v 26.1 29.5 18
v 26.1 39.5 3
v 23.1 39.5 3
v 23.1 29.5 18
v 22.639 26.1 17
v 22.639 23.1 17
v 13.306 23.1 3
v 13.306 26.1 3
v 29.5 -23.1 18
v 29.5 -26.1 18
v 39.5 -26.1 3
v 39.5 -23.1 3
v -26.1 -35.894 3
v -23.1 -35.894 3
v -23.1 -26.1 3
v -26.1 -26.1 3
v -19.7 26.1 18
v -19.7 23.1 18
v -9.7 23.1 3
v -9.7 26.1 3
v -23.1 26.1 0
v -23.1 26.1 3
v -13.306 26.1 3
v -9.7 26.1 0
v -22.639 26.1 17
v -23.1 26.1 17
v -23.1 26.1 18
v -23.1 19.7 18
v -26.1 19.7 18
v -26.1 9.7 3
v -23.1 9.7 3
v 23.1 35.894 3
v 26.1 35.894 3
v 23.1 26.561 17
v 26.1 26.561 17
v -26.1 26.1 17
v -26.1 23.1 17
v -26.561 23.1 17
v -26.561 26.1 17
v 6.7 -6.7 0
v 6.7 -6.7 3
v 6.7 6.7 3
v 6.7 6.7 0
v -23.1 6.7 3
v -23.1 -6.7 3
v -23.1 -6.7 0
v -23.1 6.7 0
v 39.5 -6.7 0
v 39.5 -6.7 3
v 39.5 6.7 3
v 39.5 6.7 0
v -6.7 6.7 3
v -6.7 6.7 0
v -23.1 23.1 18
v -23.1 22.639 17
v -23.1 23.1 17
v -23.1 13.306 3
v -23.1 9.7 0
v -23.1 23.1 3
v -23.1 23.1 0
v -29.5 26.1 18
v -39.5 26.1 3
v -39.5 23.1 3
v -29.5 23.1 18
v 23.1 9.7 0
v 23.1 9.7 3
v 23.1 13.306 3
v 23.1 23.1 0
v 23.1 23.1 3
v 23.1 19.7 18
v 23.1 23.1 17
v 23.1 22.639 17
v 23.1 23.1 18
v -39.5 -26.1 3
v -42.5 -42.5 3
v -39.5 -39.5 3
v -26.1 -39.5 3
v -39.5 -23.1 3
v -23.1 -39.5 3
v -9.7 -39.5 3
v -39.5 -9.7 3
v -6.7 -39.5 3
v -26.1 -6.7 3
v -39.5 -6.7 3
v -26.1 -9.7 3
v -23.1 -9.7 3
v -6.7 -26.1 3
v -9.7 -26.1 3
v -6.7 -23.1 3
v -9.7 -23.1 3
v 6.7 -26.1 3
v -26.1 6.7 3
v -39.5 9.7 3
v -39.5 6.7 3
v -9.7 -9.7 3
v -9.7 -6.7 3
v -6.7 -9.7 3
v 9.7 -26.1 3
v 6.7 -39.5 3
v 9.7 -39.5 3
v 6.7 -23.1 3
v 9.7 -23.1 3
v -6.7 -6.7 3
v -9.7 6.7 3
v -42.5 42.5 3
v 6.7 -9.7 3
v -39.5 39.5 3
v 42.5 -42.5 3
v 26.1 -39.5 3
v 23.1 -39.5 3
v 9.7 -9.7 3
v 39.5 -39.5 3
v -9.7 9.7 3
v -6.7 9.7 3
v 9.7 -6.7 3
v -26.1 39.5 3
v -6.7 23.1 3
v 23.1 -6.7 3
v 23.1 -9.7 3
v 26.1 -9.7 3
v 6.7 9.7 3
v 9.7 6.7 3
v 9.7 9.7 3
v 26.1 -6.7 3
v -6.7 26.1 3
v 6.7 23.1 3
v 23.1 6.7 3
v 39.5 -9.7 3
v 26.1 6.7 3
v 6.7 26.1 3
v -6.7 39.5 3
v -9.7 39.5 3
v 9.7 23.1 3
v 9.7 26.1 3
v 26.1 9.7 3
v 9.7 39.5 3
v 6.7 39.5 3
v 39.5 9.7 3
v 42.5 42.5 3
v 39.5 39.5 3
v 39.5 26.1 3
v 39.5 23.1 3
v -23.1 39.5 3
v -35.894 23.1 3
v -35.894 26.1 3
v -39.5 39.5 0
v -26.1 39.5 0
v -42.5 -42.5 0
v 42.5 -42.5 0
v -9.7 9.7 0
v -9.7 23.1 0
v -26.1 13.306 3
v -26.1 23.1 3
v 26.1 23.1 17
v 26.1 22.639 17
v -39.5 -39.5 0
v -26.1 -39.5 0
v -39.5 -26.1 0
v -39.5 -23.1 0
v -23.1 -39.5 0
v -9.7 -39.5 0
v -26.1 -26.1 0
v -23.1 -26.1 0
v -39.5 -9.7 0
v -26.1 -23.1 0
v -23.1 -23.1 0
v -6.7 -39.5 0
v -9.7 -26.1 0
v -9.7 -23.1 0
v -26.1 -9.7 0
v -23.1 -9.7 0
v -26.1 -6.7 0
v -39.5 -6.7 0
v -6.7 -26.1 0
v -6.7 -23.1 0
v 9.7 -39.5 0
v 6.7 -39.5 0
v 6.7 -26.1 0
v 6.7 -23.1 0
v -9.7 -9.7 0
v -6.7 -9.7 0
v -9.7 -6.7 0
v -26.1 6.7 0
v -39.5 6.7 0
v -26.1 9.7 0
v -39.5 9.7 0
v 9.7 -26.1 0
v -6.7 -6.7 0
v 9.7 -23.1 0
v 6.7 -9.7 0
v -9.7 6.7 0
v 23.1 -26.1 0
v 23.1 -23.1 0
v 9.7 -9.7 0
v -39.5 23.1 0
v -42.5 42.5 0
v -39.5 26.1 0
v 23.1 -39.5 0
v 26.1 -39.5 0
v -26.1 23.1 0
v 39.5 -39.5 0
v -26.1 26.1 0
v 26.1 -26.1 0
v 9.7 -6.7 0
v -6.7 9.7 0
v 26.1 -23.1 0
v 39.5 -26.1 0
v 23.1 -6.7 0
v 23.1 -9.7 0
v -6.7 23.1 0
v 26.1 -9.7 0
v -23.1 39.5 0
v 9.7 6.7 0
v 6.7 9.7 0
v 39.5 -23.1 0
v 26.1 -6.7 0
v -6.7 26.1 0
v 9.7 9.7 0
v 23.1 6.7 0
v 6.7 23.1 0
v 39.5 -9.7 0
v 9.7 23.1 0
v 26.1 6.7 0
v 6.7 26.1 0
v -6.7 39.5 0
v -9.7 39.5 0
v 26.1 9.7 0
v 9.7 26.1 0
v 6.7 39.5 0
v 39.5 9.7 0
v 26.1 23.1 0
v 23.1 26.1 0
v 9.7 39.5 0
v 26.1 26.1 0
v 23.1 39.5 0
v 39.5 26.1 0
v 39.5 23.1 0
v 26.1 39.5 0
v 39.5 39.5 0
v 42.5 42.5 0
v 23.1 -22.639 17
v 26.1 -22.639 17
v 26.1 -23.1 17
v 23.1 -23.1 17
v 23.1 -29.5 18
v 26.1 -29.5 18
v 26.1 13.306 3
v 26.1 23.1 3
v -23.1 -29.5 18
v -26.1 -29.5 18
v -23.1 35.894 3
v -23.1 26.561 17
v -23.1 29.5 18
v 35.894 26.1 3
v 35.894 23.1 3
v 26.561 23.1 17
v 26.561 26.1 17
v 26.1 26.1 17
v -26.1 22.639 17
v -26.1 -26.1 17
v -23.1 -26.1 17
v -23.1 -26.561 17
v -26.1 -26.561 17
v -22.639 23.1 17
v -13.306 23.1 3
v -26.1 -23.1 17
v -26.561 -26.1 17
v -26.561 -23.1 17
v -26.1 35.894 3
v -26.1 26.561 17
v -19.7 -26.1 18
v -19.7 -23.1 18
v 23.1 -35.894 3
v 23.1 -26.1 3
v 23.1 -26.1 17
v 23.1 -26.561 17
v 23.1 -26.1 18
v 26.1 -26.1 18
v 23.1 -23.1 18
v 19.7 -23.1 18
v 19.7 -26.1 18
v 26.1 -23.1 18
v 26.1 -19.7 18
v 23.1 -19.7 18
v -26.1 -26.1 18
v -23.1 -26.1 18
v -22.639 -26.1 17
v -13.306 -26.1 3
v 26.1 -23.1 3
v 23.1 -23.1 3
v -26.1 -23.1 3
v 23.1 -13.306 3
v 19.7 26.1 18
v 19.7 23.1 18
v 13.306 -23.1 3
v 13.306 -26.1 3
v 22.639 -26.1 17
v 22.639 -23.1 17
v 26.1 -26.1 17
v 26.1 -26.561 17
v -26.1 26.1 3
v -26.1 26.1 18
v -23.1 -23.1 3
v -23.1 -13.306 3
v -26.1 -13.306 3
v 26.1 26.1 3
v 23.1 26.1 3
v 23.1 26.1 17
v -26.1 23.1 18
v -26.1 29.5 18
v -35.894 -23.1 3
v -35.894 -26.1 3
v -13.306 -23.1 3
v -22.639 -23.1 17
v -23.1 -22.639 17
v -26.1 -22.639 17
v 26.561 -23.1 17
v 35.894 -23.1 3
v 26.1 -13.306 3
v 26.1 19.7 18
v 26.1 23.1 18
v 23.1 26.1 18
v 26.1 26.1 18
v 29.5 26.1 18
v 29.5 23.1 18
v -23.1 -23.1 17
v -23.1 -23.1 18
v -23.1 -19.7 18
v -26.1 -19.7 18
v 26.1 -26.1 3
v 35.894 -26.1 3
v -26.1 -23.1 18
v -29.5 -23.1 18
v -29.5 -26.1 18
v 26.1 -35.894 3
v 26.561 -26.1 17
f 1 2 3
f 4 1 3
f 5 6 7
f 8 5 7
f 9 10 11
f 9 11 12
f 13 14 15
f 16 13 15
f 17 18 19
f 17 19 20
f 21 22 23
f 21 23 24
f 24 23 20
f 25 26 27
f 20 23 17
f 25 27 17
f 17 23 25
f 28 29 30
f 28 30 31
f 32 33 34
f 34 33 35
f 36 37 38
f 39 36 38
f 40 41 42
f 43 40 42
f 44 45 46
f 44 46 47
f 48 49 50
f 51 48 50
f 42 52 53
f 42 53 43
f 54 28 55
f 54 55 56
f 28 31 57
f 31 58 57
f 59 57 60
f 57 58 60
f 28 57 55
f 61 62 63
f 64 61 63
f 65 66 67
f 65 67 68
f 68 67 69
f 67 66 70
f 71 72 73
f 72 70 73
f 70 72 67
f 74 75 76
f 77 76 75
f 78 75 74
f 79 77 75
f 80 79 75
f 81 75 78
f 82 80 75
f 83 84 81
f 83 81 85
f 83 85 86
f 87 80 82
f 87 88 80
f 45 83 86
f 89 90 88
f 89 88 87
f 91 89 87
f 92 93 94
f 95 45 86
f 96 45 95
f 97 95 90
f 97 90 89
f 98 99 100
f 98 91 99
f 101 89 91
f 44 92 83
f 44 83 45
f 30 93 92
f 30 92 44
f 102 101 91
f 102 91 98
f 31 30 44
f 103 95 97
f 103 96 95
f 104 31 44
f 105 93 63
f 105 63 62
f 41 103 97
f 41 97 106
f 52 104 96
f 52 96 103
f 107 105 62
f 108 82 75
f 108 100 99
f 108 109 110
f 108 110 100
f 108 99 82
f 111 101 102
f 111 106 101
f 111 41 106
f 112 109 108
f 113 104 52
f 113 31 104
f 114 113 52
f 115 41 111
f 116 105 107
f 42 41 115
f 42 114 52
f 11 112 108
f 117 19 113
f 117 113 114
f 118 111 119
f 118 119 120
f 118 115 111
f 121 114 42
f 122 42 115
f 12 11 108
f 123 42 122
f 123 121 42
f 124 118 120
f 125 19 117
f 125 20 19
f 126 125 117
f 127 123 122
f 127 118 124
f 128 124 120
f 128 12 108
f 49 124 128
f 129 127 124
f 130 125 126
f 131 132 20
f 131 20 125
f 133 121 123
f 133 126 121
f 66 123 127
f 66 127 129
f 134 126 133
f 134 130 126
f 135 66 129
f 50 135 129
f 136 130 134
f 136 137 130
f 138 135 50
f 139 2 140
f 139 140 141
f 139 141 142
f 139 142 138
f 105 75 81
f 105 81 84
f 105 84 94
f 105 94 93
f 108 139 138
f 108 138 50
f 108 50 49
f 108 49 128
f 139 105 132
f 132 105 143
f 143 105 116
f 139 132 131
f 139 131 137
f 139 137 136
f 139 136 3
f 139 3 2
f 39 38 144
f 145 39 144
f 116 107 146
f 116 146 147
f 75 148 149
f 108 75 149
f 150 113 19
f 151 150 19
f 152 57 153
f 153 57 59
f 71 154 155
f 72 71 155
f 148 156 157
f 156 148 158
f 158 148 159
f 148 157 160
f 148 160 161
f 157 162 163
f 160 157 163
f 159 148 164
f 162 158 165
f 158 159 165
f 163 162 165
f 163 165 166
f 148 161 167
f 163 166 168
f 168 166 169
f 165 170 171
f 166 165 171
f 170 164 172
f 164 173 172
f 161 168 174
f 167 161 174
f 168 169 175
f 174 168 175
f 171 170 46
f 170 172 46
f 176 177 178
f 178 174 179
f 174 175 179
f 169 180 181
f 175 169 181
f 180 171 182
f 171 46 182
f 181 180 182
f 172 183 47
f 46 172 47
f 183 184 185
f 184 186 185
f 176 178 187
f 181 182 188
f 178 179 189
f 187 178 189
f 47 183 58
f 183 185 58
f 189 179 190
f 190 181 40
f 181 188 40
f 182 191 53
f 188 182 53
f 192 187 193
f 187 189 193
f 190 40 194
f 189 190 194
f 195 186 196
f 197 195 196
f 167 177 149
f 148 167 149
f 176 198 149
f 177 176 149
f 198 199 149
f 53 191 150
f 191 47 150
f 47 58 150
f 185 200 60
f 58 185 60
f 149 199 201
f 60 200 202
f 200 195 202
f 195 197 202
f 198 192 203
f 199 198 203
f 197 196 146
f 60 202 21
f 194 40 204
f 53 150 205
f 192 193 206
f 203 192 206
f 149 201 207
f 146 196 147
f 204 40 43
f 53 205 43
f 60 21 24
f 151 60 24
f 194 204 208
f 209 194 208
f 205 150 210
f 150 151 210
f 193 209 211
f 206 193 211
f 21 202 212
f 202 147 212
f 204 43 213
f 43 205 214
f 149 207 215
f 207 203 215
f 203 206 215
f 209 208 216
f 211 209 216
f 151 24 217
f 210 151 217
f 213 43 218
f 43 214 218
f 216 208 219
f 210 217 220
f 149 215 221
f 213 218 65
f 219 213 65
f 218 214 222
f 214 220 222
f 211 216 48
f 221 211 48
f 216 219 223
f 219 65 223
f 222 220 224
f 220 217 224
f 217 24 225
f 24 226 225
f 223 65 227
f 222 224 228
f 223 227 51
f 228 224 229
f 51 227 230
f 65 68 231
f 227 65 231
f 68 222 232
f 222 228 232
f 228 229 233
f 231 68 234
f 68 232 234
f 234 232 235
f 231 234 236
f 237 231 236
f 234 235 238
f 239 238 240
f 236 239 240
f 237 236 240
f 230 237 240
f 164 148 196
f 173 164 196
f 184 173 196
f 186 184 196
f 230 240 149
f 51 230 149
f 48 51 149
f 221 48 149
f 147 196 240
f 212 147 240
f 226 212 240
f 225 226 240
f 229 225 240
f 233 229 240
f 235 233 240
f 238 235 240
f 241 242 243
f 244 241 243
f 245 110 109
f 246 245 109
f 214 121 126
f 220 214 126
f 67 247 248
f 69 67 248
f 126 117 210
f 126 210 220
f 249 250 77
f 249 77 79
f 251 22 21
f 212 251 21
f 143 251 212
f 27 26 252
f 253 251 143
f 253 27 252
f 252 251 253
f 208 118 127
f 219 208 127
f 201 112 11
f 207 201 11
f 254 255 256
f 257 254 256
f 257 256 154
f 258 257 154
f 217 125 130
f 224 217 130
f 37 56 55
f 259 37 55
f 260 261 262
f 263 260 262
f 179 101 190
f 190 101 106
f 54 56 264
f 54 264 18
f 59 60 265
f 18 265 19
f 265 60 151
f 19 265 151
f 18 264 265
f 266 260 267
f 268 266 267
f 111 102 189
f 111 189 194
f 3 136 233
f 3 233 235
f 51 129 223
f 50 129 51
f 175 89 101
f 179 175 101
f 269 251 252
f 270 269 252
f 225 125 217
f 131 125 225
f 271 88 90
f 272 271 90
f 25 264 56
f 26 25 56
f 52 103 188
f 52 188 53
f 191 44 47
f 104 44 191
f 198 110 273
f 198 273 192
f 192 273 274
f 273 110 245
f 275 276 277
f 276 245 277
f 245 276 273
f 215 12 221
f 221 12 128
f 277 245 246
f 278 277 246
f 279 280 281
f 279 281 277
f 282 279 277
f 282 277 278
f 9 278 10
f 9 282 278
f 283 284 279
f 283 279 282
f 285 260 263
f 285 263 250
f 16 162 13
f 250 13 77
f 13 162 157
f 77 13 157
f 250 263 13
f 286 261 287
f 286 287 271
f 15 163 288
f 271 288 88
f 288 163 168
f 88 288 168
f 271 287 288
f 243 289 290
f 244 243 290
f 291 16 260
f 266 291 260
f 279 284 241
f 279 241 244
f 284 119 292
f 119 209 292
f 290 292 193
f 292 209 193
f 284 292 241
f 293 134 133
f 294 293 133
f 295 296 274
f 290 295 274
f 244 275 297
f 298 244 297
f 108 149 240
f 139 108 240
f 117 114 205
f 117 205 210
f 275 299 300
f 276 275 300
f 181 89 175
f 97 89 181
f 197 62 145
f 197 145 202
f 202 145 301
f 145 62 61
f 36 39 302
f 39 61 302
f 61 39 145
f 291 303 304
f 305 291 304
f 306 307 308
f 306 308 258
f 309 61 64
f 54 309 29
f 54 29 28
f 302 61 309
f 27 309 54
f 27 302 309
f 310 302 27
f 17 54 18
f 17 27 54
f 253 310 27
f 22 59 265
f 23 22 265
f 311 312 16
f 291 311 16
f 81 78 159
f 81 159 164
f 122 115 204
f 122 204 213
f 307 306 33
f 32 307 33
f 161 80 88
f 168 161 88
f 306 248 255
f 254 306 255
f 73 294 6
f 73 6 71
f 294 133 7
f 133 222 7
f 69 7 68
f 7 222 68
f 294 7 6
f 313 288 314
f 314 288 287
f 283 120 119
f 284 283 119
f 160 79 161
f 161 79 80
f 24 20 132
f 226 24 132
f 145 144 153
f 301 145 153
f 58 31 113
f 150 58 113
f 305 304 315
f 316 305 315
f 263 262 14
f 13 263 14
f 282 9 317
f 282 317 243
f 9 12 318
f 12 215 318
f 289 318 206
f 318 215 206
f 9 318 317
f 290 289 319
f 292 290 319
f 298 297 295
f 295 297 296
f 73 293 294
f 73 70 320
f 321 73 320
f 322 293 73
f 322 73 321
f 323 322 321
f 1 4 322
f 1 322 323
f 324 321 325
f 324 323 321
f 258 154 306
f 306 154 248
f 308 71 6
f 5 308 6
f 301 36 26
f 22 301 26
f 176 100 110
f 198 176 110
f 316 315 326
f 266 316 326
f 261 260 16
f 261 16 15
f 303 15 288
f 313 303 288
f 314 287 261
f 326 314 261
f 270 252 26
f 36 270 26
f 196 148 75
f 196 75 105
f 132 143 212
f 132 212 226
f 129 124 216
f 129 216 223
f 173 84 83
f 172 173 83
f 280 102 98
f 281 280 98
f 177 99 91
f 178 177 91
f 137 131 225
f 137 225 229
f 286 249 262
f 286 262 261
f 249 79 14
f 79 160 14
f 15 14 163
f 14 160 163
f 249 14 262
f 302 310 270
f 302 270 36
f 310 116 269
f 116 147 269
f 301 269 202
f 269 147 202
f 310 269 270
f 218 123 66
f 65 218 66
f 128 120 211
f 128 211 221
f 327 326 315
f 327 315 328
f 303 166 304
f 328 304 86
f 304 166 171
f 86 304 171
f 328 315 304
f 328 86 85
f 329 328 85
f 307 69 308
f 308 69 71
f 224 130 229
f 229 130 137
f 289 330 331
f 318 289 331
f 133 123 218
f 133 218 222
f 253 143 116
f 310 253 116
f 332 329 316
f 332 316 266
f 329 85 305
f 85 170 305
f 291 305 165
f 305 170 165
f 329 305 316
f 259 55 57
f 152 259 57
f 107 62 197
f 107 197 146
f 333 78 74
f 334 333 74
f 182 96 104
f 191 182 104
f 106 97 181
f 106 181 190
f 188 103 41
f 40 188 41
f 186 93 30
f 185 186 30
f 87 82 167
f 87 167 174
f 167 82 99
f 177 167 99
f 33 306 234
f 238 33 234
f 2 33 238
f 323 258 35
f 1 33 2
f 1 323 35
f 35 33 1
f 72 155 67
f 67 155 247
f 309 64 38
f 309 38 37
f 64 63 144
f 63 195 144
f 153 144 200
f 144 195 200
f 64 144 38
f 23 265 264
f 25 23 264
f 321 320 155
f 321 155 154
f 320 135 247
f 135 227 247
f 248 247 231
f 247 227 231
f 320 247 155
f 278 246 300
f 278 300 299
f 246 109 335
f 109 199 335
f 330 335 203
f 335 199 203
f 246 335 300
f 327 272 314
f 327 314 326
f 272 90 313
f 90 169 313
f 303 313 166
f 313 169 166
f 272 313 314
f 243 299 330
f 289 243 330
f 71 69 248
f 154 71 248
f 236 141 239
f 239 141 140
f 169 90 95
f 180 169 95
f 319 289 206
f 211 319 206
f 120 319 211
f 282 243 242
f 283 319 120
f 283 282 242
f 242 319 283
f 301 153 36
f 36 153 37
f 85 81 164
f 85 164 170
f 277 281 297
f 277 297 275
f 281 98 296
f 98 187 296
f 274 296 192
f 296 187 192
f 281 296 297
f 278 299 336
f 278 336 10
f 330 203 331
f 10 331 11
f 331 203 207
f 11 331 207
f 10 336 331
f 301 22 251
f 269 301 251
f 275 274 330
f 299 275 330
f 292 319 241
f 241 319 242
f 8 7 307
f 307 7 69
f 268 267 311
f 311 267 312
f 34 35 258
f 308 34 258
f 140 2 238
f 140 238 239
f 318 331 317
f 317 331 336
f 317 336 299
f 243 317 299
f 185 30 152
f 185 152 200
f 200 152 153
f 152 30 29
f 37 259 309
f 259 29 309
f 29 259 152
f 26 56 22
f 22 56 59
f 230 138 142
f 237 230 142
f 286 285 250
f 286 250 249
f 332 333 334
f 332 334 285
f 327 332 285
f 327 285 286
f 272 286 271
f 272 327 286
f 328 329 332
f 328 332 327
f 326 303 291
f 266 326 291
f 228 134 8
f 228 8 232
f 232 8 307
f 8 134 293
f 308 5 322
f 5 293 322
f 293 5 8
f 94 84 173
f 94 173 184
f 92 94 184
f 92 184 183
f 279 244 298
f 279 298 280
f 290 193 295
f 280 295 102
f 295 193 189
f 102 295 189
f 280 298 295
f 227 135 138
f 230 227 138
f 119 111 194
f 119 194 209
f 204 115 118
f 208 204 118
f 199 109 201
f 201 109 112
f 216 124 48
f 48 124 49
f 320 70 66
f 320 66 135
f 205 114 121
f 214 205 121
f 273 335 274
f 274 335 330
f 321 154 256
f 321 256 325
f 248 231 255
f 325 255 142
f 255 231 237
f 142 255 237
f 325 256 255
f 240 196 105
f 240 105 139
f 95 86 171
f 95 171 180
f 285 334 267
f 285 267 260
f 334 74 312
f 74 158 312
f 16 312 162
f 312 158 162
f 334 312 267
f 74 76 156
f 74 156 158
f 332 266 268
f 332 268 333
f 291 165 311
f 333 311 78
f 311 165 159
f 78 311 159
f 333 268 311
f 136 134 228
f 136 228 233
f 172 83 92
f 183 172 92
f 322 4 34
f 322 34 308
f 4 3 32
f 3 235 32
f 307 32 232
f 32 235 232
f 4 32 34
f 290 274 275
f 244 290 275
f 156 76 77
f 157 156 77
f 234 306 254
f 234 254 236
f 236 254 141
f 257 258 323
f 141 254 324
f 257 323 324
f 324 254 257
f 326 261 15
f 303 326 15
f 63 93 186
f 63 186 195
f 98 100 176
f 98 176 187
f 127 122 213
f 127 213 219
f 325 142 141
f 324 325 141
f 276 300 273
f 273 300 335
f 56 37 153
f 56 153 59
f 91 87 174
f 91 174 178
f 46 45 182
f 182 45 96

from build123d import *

# Parameters (mm, degrees)
F0_W       = 85
F0_H       = 85
F1_DEPTH   = 3
F2_W       = 13.4
F2_H       = 13.4
F3_DEPTH   = 25
F5_DEPTH   = 15
F6_SIZE2   = 14.99999
F6_SIZE    = 9.99999
F6_2_SIZE2 = 14.99999
F6_2_SIZE  = 9.99999
F6_3_SIZE2 = 14.99999
F6_3_SIZE  = 9.99999
F6_4_SIZE2 = 14.99999
F6_4_SIZE  = 9.99999
F7_SIZE2   = 9.99999
F7_SIZE    = 14.99999
F7_2_SIZE2 = 9.99999
F7_2_SIZE  = 14.99999
F7_3_SIZE2 = 9.99999
F7_3_SIZE  = 14.99999
F7_4_SIZE2 = 9.99999
F7_4_SIZE  = 14.99999
F7_5_SIZE2 = 9.99999
F7_5_SIZE  = 14.99999
F9_DEPTH   = 68.601
F11_DEPTH  = 68.601


# Not quite as in the source:
# - a fillet or chamfer is up to 0.001 mm smaller than in the source, because OpenCascade refuses the exact size
# - a feature names something its author has since deleted; it is built from what else it names


with BuildPart() as f1:
    # F0 (on Top) → F1 (new body)
    with BuildSketch(Plane.XY):
        Rectangle(F0_W, F0_H)
    extrude(amount=F1_DEPTH)

    # F2 (on face) → F3 (cut)
    with BuildSketch(Plane.XY.offset(3)):
        with Locations((-32.8, 16.4)):
            Rectangle(F2_W, F2_H)
        with Locations((-32.8, 0)):
            Rectangle(F2_W, F2_H)
        with Locations((-32.8, -16.4)):
            Rectangle(F2_W, F2_H)
        with Locations((-32.8, -32.8)):
            Rectangle(F2_W, F2_H)
        with Locations((-16.4, 32.8)):
            Rectangle(F2_W, F2_H)
        with Locations((-16.4, 16.4)):
            Rectangle(F2_W, F2_H)
        with Locations((-16.4, 0)):
            Rectangle(F2_W, F2_H)
        with Locations((-16.4, -16.4)):
            Rectangle(F2_W, F2_H)
        with Locations((-16.4, -32.8)):
            Rectangle(F2_W, F2_H)
        with Locations((0, 32.8)):
            Rectangle(F2_W, F2_H)
        with Locations((0, 16.4)):
            Rectangle(F2_W, F2_H)
        Rectangle(F2_W, F2_H)
        with Locations((0, -16.4)):
            Rectangle(F2_W, F2_H)
        with Locations((0, -32.8)):
            Rectangle(F2_W, F2_H)
        with Locations((16.4, 32.8)):
            Rectangle(F2_W, F2_H)
        with Locations((16.4, 16.4)):
            Rectangle(F2_W, F2_H)
        with Locations((16.4, 0)):
            Rectangle(F2_W, F2_H)
        with Locations((16.4, -16.4)):
            Rectangle(F2_W, F2_H)
        with Locations((16.4, -32.8)):
            Rectangle(F2_W, F2_H)
        with Locations((32.8, 32.8)):
            Rectangle(F2_W, F2_H)
        with Locations((32.8, 16.4)):
            Rectangle(F2_W, F2_H)
        with Locations((32.8, 0)):
            Rectangle(F2_W, F2_H)
        with Locations((32.8, -16.4)):
            Rectangle(F2_W, F2_H)
        with Locations((32.8, -32.8)):
            Rectangle(F2_W, F2_H)
        with Locations((-32.8, 32.8)):
            Rectangle(F2_W, F2_H)
    extrude(amount=-F3_DEPTH, mode=Mode.SUBTRACT)

    # F4 (on face) → F5 (join)
    with BuildSketch(Plane.XY.offset(3)):
        Polygon((-23.1, -9.7), (-26.1, -9.7), (-26.1, -23.1), (-39.5, -23.1), (-39.5, -26.1), (-26.1, -26.1), (-26.1, -39.5), (-23.1, -39.5), (-23.1, -26.1), (-9.7, -26.1), (-9.7, -23.1), (-23.1, -23.1), align=None)
        Polygon((-9.7, 23.1), (-9.7, 26.1), (-23.1, 26.1), (-23.1, 39.5), (-26.1, 39.5), (-26.1, 26.1), (-39.5, 26.1), (-39.5, 23.1), (-26.1, 23.1), (-26.1, 9.7), (-23.1, 9.7), (-23.1, 23.1), align=None)
        Polygon((26.1, 26.1), (26.1, 39.5), (23.1, 39.5), (23.1, 26.1), (9.7, 26.1), (9.7, 23.1), (23.1, 23.1), (23.1, 9.7), (26.1, 9.7), (26.1, 23.1), (39.5, 23.1), (39.5, 26.1), align=None)
        Polygon((26.1, -23.1), (26.1, -9.7), (23.1, -9.7), (23.1, -23.1), (9.7, -23.1), (9.7, -26.1), (23.1, -26.1), (23.1, -39.5), (26.1, -39.5), (26.1, -26.1), (39.5, -26.1), (39.5, -23.1), align=None)
    extrude(amount=F5_DEPTH)

    # F6 (size 10 and 15 in the source; OpenCascade refuses exactly that, so slightly less here)
    f6_edges = [f1.edges().sort_by_distance(p)[0] for p in [
        (-39.5, -24.6, 18),
        (-24.6, -9.7, 18),
        (-9.7, -24.6, 18),
        (-24.6, -39.5, 18),
    ]]
    f6_side = f1.faces().sort_by_distance((-24.6, -24.6, 18))[0]
    chamfer(f6_edges, length=F6_SIZE, length2=F6_SIZE2, reference=f6_side)

    # F6#2 (size 10 and 15 in the source; OpenCascade refuses exactly that, so slightly less here)
    f6_2_edges = [f1.edges().sort_by_distance(p)[0] for p in [
        (-39.5, 24.6, 18),
        (-24.6, 39.5, 18),
    ]]
    f6_2_side = f1.faces().sort_by_distance((-24.6, 24.6, 18))[0]
    chamfer(f6_2_edges, length=F6_2_SIZE, length2=F6_2_SIZE2, reference=f6_2_side)

    # F6#3 (size 10 and 15 in the source; OpenCascade refuses exactly that, so slightly less here)
    f6_3_edges = [f1.edges().sort_by_distance(p)[0] for p in [
        (9.7, 24.6, 18),
        (24.6, 39.5, 18),
    ]]
    f6_3_side = f1.faces().sort_by_distance((24.6, 24.6, 18))[0]
    chamfer(f6_3_edges, length=F6_3_SIZE, length2=F6_3_SIZE2, reference=f6_3_side)

    # F6#4 (size 10 and 15 in the source; OpenCascade refuses exactly that, so slightly less here)
    f6_4_edges = [f1.edges().sort_by_distance(p)[0] for p in [
        (24.6, -9.7, 18),
        (9.7, -24.6, 18),
        (39.5, -24.6, 18),
    ]]
    f6_4_side = f1.faces().sort_by_distance((24.6, -24.6, 18))[0]
    chamfer(f6_4_edges, length=F6_4_SIZE, length2=F6_4_SIZE2, reference=f6_4_side)

    # F7 (size 15 and 10 in the source; OpenCascade refuses exactly that, so slightly less here)
    f7_edges = [f1.edges().sort_by_distance(p)[0] for p in [
        (-9.7, 24.6, 18),
    ]]
    f7_side = f1.faces().sort_by_distance((-9.7, 24.6, 10.5))[0]
    chamfer(f7_edges, length=F7_SIZE, length2=F7_SIZE2, reference=f7_side)

    # F7#2 (size 15 and 10 in the source; OpenCascade refuses exactly that, so slightly less here)
    f7_2_edges = [f1.edges().sort_by_distance(p)[0] for p in [
        (-24.6, 9.7, 18),
    ]]
    f7_2_side = f1.faces().sort_by_distance((-24.6, 9.7, 10.5))[0]
    chamfer(f7_2_edges, length=F7_2_SIZE, length2=F7_2_SIZE2, reference=f7_2_side)

    # F7#3 (size 15 and 10 in the source; OpenCascade refuses exactly that, so slightly less here)
    f7_3_edges = [f1.edges().sort_by_distance(p)[0] for p in [
        (24.6, 9.7, 18),
    ]]
    f7_3_side = f1.faces().sort_by_distance((24.6, 9.7, 10.5))[0]
    chamfer(f7_3_edges, length=F7_3_SIZE, length2=F7_3_SIZE2, reference=f7_3_side)

    # F7#4 (size 15 and 10 in the source; OpenCascade refuses exactly that, so slightly less here)
    f7_4_edges = [f1.edges().sort_by_distance(p)[0] for p in [
        (39.5, 24.6, 18),
    ]]
    f7_4_side = f1.faces().sort_by_distance((39.5, 24.6, 10.5))[0]
    chamfer(f7_4_edges, length=F7_4_SIZE, length2=F7_4_SIZE2, reference=f7_4_side)

    # F7#5 (size 15 and 10 in the source; OpenCascade refuses exactly that, so slightly less here)
    f7_5_edges = [f1.edges().sort_by_distance(p)[0] for p in [
        (24.6, -39.5, 18),
    ]]
    f7_5_side = f1.faces().sort_by_distance((24.6, -39.5, 10.5))[0]
    chamfer(f7_5_edges, length=F7_5_SIZE, length2=F7_5_SIZE2, reference=f7_5_side)

    # F8 (on face) → F9 (cut, through all)
    with BuildSketch(Plane.YZ.offset(26.1)):
        Polygon((-26.1, 17), (-26.5611153912, 17), (-35.8944487245, 3), (-26.1, 3), align=None)
        Polygon((-22.6388846088, 17), (-23.1, 17), (-23.1, 3), (-13.3055512755, 3), align=None)
        Polygon((23.1, 17), (22.6388846088, 17), (13.3055512755, 3), (23.1, 3), align=None)
        Polygon((26.5611153912, 17), (26.1, 17), (26.1, 3), (35.8944487245, 3), align=None)
    extrude(amount=-F9_DEPTH, mode=Mode.SUBTRACT)

    # F10 (on face) → F11 (cut, through all)
    with BuildSketch(Plane.XZ.offset(26.1)):
        Polygon((-26.1, 17), (-26.5611153912, 17), (-35.8944487245, 3), (-26.1, 3), align=None)
        Polygon((-22.6388846088, 17), (-23.1, 17), (-23.1, 3), (-13.3055512755, 3), align=None)
        Polygon((23.1, 17), (22.6388846088, 17), (13.3055512755, 3), (23.1, 3), align=None)
        Polygon((26.5611153912, 17), (26.1, 17), (26.1, 3), (35.8944487245, 3), align=None)
    extrude(amount=-F11_DEPTH, mode=Mode.SUBTRACT)


solid = f1.part
